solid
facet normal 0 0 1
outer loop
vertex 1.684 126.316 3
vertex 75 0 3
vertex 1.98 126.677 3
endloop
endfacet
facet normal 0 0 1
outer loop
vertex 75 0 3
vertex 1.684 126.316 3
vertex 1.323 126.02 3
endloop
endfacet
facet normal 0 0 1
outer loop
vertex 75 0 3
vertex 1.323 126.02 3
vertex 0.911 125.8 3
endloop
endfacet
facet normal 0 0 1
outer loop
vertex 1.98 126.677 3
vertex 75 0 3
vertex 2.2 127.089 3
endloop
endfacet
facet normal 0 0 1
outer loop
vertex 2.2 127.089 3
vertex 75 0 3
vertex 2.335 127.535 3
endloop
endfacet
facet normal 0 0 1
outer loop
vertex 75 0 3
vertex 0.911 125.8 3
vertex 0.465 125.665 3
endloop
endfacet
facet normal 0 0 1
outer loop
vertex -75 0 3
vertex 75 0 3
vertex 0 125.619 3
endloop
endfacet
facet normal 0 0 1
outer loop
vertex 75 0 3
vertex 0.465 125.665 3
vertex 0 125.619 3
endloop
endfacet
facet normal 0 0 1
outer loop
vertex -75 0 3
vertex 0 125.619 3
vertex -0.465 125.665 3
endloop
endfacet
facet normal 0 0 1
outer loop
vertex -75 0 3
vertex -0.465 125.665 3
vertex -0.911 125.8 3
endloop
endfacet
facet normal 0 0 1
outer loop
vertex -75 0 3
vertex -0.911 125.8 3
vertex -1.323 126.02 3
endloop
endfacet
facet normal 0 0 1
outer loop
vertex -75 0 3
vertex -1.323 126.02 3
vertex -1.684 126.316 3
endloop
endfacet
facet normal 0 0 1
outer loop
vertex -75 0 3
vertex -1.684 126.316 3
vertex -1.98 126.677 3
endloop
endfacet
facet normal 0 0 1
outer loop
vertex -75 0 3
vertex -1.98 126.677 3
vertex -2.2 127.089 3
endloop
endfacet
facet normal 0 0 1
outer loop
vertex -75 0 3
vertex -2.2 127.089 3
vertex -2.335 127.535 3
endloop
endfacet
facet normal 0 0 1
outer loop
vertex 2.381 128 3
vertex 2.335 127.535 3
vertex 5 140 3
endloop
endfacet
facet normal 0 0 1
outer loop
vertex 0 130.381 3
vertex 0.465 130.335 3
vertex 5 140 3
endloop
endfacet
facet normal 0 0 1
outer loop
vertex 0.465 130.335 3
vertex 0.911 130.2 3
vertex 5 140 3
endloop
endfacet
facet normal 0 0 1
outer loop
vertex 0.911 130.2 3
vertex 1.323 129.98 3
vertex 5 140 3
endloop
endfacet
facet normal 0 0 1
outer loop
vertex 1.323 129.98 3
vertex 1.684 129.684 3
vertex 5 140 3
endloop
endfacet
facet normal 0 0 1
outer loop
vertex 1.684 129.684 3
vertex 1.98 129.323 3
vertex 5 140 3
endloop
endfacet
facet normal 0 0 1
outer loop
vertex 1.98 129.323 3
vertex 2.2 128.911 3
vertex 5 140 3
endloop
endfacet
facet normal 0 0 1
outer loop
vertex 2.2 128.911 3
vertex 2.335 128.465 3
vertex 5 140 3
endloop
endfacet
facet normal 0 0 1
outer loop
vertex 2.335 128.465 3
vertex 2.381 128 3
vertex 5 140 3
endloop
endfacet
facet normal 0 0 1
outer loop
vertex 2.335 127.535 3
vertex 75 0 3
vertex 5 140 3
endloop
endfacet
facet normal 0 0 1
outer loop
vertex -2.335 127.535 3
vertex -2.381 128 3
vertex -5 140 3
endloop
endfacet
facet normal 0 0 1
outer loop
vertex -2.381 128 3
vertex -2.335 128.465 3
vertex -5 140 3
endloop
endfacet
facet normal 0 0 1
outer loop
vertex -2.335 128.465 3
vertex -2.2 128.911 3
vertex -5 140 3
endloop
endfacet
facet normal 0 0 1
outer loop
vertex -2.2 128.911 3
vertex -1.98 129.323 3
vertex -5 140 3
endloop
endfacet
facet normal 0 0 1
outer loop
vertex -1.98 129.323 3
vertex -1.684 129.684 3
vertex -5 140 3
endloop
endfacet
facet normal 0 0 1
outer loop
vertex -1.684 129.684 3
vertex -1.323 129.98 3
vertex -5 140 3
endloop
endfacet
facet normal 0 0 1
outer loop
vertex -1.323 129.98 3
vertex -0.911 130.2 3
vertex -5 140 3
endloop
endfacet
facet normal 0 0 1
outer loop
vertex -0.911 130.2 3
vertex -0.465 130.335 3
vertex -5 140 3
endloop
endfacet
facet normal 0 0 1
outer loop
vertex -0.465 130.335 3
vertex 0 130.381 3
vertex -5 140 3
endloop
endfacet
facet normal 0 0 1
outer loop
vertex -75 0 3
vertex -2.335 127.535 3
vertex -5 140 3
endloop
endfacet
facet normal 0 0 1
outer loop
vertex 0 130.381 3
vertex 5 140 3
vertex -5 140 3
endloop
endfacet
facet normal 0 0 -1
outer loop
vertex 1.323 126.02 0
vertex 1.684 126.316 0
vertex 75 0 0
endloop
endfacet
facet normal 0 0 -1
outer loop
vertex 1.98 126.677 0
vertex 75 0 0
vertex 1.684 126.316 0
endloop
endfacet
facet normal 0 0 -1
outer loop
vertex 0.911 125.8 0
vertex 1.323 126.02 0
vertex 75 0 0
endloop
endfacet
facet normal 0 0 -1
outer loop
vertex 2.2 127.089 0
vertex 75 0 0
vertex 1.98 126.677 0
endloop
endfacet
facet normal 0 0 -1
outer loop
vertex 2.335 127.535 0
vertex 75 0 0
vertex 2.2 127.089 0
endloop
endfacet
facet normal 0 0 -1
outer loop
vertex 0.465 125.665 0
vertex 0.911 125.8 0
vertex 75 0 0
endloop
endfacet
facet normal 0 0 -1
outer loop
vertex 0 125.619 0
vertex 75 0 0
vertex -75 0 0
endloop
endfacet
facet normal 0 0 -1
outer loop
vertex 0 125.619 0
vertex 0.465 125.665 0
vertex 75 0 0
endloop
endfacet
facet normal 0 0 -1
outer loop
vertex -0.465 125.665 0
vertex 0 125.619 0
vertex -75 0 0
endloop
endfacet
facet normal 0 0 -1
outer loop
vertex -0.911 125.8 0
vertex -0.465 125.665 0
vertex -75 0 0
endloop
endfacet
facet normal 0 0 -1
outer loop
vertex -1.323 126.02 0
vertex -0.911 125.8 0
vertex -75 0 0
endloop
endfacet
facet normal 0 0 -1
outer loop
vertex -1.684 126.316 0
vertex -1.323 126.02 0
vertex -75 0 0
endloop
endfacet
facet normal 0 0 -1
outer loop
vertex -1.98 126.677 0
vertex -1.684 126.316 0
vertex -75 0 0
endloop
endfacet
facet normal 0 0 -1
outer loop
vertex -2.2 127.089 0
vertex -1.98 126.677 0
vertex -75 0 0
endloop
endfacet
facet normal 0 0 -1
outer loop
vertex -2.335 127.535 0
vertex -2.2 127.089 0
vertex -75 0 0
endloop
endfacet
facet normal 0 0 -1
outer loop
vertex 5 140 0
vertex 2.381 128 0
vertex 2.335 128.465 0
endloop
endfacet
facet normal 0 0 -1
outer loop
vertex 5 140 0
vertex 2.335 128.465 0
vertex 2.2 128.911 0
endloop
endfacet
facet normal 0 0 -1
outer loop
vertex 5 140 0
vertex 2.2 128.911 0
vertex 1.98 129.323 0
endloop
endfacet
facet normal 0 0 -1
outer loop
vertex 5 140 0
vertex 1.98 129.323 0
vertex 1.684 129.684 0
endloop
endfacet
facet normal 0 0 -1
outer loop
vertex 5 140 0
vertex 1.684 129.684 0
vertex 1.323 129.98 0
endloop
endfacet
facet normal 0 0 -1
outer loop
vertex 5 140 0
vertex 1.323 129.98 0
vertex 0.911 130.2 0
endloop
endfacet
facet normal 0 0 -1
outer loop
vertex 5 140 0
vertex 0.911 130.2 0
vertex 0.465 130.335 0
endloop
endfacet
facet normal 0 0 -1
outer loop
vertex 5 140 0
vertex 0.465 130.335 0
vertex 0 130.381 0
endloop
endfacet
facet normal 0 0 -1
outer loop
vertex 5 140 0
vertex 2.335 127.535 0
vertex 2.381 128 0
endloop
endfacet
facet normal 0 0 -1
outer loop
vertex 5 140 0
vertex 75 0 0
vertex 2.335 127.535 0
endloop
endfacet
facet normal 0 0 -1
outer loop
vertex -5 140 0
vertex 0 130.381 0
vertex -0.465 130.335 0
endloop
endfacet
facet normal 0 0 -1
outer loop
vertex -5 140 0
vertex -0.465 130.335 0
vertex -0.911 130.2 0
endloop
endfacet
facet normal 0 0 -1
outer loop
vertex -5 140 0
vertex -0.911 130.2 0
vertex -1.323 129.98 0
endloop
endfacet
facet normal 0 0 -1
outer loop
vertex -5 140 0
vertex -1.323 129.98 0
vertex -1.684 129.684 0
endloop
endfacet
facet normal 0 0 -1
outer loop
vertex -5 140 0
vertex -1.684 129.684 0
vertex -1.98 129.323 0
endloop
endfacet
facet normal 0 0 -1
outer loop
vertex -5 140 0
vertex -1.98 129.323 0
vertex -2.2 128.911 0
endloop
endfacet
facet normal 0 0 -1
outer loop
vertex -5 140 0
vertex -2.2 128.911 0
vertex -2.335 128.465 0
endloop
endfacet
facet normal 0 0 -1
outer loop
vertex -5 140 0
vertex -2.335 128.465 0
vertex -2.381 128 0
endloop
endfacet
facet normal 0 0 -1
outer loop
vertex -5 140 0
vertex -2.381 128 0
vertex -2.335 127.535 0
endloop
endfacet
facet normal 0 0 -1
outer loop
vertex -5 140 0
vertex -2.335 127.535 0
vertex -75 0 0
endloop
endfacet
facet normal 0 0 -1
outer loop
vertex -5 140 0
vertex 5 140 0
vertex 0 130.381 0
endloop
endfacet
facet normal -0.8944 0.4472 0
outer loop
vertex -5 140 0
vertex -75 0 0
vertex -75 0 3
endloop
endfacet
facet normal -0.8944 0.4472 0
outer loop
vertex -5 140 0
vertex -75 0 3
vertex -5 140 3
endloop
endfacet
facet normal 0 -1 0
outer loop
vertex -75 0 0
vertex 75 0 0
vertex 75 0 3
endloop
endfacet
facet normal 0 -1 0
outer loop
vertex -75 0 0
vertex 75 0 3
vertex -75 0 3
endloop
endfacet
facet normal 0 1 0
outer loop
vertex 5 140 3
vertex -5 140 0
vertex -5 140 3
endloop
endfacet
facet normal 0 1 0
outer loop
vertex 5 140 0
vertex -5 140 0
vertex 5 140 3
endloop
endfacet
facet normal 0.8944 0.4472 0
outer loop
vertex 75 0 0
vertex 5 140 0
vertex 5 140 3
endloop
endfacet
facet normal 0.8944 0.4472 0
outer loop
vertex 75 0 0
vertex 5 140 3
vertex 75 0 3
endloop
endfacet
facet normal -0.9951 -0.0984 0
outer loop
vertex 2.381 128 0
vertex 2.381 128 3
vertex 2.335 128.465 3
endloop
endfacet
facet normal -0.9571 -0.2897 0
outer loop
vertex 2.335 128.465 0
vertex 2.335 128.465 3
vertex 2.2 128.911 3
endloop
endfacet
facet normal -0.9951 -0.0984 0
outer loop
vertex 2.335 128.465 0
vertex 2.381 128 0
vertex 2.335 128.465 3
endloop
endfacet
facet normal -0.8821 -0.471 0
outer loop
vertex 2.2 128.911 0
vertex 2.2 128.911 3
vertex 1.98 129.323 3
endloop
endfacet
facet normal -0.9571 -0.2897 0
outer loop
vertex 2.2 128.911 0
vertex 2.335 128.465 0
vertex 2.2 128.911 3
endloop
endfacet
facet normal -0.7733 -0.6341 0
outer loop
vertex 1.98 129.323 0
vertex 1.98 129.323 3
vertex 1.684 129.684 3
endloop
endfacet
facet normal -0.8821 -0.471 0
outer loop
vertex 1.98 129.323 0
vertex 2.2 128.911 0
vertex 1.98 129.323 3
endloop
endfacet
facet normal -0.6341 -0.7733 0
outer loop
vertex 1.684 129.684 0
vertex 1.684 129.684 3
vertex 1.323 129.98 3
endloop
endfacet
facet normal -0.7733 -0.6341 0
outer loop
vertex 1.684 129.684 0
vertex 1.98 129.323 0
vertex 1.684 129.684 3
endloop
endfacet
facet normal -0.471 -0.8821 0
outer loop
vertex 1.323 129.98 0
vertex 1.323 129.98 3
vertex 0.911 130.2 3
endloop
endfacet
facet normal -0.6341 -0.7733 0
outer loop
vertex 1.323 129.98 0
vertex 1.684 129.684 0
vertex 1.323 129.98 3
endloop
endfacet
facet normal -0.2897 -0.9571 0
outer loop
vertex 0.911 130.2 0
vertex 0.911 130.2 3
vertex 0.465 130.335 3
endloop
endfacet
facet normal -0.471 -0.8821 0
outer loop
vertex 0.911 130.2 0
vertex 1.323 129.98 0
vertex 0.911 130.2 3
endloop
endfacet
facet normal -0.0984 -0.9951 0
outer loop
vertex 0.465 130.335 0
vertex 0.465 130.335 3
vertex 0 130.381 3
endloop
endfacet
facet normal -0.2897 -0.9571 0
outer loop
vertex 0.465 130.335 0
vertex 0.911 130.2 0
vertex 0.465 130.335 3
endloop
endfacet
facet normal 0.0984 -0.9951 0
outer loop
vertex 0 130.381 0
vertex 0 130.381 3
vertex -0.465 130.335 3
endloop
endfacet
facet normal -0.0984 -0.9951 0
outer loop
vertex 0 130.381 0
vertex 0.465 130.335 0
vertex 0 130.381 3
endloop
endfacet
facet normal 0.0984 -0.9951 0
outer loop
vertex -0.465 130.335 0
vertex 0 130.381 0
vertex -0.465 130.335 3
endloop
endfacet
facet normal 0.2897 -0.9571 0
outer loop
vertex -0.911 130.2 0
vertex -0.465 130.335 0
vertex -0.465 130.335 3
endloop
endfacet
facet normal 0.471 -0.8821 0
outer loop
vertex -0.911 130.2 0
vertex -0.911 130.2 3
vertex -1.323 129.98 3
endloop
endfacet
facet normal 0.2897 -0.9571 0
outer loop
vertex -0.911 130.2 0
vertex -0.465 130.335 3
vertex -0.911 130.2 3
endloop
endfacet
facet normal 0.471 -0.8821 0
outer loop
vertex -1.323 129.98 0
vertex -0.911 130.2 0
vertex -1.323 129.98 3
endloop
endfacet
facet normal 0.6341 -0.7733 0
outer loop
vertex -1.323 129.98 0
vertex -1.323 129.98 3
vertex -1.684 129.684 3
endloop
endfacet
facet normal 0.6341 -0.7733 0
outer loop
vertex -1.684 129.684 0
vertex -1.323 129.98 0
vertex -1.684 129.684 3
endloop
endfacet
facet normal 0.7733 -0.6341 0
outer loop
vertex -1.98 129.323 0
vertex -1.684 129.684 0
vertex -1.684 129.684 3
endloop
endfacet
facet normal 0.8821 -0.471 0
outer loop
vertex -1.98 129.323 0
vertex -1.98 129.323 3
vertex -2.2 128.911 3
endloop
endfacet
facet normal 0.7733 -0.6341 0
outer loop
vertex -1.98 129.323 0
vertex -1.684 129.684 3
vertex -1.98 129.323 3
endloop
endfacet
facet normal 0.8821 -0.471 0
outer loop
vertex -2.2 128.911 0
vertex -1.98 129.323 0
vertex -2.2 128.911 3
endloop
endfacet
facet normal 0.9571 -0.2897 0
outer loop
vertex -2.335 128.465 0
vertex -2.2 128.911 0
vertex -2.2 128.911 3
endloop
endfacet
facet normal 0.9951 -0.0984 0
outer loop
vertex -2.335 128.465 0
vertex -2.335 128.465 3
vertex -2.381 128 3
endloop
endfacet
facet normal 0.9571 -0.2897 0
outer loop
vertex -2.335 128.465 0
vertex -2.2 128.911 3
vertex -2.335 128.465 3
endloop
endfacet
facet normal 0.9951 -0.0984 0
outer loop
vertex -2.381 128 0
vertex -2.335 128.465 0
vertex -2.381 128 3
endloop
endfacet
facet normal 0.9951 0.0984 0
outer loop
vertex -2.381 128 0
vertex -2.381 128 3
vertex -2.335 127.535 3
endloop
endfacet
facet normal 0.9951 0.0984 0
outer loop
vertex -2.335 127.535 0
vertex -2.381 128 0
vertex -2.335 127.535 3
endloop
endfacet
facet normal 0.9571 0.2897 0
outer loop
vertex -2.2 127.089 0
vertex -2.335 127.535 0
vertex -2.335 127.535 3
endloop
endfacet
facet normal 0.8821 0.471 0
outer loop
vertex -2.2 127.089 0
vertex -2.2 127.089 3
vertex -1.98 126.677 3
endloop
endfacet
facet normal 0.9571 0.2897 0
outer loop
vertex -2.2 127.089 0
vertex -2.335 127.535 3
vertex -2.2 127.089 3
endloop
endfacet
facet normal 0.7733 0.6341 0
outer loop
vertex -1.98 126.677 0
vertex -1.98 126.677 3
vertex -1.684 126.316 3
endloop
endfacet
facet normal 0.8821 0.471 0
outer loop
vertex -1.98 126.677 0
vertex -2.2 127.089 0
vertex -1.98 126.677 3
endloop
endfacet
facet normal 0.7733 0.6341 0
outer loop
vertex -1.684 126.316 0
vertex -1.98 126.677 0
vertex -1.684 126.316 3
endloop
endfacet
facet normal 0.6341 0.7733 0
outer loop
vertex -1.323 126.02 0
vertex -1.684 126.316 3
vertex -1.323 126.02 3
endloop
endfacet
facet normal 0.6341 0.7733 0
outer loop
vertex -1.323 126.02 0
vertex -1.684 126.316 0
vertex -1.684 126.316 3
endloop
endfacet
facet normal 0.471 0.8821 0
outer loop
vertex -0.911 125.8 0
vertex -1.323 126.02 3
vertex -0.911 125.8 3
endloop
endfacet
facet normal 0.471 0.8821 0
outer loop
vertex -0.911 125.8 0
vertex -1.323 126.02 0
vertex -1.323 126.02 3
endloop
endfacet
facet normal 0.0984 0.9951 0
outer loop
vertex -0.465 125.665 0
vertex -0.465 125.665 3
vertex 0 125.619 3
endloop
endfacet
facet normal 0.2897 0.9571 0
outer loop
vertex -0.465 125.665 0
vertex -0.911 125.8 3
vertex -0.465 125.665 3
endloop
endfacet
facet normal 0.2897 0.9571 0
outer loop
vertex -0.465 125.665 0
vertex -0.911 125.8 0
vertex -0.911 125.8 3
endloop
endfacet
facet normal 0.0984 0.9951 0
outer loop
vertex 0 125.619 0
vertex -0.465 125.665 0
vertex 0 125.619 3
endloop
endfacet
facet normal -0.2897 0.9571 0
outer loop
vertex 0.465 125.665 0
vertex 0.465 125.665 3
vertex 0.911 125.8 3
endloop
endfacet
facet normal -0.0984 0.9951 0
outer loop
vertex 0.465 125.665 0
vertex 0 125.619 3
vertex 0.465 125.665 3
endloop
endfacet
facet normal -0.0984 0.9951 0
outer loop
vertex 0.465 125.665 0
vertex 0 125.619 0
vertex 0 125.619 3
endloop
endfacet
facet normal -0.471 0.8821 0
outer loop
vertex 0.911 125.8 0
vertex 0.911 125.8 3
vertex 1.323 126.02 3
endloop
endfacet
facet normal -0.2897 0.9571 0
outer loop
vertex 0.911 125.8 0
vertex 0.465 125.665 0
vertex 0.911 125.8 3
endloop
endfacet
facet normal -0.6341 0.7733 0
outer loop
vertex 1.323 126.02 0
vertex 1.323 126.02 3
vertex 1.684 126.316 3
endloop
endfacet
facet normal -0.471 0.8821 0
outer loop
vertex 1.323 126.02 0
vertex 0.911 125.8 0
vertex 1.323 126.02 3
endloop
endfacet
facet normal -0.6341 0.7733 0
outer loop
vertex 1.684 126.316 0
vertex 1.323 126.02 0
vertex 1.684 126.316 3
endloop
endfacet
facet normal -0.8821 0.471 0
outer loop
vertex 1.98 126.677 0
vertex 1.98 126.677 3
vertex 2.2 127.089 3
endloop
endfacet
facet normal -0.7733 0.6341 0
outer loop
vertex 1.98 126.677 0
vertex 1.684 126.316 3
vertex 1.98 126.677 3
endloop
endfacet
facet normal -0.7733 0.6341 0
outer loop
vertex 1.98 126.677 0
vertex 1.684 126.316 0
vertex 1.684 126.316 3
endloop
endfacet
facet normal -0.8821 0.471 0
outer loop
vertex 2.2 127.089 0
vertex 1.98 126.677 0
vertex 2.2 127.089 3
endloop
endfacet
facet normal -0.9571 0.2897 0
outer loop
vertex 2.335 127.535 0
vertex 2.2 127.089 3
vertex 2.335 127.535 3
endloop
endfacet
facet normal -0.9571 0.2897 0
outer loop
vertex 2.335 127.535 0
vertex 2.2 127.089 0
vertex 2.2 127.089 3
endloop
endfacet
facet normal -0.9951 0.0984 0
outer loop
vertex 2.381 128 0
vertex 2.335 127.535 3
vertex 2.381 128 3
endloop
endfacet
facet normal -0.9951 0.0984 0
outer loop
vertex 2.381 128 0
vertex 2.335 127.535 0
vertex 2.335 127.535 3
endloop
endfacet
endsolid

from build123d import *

# Parameters (mm, degrees)
SALIENTE_EXTRUIR1_DEPTH = 3
CROQUIS2_R              = 2.38125
CORTAR_EXTRUIR1_DEPTH   = 4


with BuildPart() as part:
    # Croquis1 → Saliente-Extruir1 (new body)
    with BuildSketch(Plane.XY):
        Polygon((75, 0), (-75, 0), (0, 150), align=None)
    extrude(amount=SALIENTE_EXTRUIR1_DEPTH)

    # Croquis2 → Cortar-Extruir1 (cut, through all)
    with BuildSketch(Plane.XY):
        with Locations((0, 128)):
            Circle(CROQUIS2_R)
        Polygon((5, 140), (0, 150), (-5, 140), align=None)
    extrude(amount=CORTAR_EXTRUIR1_DEPTH, mode=Mode.SUBTRACT)


solid = part.part
